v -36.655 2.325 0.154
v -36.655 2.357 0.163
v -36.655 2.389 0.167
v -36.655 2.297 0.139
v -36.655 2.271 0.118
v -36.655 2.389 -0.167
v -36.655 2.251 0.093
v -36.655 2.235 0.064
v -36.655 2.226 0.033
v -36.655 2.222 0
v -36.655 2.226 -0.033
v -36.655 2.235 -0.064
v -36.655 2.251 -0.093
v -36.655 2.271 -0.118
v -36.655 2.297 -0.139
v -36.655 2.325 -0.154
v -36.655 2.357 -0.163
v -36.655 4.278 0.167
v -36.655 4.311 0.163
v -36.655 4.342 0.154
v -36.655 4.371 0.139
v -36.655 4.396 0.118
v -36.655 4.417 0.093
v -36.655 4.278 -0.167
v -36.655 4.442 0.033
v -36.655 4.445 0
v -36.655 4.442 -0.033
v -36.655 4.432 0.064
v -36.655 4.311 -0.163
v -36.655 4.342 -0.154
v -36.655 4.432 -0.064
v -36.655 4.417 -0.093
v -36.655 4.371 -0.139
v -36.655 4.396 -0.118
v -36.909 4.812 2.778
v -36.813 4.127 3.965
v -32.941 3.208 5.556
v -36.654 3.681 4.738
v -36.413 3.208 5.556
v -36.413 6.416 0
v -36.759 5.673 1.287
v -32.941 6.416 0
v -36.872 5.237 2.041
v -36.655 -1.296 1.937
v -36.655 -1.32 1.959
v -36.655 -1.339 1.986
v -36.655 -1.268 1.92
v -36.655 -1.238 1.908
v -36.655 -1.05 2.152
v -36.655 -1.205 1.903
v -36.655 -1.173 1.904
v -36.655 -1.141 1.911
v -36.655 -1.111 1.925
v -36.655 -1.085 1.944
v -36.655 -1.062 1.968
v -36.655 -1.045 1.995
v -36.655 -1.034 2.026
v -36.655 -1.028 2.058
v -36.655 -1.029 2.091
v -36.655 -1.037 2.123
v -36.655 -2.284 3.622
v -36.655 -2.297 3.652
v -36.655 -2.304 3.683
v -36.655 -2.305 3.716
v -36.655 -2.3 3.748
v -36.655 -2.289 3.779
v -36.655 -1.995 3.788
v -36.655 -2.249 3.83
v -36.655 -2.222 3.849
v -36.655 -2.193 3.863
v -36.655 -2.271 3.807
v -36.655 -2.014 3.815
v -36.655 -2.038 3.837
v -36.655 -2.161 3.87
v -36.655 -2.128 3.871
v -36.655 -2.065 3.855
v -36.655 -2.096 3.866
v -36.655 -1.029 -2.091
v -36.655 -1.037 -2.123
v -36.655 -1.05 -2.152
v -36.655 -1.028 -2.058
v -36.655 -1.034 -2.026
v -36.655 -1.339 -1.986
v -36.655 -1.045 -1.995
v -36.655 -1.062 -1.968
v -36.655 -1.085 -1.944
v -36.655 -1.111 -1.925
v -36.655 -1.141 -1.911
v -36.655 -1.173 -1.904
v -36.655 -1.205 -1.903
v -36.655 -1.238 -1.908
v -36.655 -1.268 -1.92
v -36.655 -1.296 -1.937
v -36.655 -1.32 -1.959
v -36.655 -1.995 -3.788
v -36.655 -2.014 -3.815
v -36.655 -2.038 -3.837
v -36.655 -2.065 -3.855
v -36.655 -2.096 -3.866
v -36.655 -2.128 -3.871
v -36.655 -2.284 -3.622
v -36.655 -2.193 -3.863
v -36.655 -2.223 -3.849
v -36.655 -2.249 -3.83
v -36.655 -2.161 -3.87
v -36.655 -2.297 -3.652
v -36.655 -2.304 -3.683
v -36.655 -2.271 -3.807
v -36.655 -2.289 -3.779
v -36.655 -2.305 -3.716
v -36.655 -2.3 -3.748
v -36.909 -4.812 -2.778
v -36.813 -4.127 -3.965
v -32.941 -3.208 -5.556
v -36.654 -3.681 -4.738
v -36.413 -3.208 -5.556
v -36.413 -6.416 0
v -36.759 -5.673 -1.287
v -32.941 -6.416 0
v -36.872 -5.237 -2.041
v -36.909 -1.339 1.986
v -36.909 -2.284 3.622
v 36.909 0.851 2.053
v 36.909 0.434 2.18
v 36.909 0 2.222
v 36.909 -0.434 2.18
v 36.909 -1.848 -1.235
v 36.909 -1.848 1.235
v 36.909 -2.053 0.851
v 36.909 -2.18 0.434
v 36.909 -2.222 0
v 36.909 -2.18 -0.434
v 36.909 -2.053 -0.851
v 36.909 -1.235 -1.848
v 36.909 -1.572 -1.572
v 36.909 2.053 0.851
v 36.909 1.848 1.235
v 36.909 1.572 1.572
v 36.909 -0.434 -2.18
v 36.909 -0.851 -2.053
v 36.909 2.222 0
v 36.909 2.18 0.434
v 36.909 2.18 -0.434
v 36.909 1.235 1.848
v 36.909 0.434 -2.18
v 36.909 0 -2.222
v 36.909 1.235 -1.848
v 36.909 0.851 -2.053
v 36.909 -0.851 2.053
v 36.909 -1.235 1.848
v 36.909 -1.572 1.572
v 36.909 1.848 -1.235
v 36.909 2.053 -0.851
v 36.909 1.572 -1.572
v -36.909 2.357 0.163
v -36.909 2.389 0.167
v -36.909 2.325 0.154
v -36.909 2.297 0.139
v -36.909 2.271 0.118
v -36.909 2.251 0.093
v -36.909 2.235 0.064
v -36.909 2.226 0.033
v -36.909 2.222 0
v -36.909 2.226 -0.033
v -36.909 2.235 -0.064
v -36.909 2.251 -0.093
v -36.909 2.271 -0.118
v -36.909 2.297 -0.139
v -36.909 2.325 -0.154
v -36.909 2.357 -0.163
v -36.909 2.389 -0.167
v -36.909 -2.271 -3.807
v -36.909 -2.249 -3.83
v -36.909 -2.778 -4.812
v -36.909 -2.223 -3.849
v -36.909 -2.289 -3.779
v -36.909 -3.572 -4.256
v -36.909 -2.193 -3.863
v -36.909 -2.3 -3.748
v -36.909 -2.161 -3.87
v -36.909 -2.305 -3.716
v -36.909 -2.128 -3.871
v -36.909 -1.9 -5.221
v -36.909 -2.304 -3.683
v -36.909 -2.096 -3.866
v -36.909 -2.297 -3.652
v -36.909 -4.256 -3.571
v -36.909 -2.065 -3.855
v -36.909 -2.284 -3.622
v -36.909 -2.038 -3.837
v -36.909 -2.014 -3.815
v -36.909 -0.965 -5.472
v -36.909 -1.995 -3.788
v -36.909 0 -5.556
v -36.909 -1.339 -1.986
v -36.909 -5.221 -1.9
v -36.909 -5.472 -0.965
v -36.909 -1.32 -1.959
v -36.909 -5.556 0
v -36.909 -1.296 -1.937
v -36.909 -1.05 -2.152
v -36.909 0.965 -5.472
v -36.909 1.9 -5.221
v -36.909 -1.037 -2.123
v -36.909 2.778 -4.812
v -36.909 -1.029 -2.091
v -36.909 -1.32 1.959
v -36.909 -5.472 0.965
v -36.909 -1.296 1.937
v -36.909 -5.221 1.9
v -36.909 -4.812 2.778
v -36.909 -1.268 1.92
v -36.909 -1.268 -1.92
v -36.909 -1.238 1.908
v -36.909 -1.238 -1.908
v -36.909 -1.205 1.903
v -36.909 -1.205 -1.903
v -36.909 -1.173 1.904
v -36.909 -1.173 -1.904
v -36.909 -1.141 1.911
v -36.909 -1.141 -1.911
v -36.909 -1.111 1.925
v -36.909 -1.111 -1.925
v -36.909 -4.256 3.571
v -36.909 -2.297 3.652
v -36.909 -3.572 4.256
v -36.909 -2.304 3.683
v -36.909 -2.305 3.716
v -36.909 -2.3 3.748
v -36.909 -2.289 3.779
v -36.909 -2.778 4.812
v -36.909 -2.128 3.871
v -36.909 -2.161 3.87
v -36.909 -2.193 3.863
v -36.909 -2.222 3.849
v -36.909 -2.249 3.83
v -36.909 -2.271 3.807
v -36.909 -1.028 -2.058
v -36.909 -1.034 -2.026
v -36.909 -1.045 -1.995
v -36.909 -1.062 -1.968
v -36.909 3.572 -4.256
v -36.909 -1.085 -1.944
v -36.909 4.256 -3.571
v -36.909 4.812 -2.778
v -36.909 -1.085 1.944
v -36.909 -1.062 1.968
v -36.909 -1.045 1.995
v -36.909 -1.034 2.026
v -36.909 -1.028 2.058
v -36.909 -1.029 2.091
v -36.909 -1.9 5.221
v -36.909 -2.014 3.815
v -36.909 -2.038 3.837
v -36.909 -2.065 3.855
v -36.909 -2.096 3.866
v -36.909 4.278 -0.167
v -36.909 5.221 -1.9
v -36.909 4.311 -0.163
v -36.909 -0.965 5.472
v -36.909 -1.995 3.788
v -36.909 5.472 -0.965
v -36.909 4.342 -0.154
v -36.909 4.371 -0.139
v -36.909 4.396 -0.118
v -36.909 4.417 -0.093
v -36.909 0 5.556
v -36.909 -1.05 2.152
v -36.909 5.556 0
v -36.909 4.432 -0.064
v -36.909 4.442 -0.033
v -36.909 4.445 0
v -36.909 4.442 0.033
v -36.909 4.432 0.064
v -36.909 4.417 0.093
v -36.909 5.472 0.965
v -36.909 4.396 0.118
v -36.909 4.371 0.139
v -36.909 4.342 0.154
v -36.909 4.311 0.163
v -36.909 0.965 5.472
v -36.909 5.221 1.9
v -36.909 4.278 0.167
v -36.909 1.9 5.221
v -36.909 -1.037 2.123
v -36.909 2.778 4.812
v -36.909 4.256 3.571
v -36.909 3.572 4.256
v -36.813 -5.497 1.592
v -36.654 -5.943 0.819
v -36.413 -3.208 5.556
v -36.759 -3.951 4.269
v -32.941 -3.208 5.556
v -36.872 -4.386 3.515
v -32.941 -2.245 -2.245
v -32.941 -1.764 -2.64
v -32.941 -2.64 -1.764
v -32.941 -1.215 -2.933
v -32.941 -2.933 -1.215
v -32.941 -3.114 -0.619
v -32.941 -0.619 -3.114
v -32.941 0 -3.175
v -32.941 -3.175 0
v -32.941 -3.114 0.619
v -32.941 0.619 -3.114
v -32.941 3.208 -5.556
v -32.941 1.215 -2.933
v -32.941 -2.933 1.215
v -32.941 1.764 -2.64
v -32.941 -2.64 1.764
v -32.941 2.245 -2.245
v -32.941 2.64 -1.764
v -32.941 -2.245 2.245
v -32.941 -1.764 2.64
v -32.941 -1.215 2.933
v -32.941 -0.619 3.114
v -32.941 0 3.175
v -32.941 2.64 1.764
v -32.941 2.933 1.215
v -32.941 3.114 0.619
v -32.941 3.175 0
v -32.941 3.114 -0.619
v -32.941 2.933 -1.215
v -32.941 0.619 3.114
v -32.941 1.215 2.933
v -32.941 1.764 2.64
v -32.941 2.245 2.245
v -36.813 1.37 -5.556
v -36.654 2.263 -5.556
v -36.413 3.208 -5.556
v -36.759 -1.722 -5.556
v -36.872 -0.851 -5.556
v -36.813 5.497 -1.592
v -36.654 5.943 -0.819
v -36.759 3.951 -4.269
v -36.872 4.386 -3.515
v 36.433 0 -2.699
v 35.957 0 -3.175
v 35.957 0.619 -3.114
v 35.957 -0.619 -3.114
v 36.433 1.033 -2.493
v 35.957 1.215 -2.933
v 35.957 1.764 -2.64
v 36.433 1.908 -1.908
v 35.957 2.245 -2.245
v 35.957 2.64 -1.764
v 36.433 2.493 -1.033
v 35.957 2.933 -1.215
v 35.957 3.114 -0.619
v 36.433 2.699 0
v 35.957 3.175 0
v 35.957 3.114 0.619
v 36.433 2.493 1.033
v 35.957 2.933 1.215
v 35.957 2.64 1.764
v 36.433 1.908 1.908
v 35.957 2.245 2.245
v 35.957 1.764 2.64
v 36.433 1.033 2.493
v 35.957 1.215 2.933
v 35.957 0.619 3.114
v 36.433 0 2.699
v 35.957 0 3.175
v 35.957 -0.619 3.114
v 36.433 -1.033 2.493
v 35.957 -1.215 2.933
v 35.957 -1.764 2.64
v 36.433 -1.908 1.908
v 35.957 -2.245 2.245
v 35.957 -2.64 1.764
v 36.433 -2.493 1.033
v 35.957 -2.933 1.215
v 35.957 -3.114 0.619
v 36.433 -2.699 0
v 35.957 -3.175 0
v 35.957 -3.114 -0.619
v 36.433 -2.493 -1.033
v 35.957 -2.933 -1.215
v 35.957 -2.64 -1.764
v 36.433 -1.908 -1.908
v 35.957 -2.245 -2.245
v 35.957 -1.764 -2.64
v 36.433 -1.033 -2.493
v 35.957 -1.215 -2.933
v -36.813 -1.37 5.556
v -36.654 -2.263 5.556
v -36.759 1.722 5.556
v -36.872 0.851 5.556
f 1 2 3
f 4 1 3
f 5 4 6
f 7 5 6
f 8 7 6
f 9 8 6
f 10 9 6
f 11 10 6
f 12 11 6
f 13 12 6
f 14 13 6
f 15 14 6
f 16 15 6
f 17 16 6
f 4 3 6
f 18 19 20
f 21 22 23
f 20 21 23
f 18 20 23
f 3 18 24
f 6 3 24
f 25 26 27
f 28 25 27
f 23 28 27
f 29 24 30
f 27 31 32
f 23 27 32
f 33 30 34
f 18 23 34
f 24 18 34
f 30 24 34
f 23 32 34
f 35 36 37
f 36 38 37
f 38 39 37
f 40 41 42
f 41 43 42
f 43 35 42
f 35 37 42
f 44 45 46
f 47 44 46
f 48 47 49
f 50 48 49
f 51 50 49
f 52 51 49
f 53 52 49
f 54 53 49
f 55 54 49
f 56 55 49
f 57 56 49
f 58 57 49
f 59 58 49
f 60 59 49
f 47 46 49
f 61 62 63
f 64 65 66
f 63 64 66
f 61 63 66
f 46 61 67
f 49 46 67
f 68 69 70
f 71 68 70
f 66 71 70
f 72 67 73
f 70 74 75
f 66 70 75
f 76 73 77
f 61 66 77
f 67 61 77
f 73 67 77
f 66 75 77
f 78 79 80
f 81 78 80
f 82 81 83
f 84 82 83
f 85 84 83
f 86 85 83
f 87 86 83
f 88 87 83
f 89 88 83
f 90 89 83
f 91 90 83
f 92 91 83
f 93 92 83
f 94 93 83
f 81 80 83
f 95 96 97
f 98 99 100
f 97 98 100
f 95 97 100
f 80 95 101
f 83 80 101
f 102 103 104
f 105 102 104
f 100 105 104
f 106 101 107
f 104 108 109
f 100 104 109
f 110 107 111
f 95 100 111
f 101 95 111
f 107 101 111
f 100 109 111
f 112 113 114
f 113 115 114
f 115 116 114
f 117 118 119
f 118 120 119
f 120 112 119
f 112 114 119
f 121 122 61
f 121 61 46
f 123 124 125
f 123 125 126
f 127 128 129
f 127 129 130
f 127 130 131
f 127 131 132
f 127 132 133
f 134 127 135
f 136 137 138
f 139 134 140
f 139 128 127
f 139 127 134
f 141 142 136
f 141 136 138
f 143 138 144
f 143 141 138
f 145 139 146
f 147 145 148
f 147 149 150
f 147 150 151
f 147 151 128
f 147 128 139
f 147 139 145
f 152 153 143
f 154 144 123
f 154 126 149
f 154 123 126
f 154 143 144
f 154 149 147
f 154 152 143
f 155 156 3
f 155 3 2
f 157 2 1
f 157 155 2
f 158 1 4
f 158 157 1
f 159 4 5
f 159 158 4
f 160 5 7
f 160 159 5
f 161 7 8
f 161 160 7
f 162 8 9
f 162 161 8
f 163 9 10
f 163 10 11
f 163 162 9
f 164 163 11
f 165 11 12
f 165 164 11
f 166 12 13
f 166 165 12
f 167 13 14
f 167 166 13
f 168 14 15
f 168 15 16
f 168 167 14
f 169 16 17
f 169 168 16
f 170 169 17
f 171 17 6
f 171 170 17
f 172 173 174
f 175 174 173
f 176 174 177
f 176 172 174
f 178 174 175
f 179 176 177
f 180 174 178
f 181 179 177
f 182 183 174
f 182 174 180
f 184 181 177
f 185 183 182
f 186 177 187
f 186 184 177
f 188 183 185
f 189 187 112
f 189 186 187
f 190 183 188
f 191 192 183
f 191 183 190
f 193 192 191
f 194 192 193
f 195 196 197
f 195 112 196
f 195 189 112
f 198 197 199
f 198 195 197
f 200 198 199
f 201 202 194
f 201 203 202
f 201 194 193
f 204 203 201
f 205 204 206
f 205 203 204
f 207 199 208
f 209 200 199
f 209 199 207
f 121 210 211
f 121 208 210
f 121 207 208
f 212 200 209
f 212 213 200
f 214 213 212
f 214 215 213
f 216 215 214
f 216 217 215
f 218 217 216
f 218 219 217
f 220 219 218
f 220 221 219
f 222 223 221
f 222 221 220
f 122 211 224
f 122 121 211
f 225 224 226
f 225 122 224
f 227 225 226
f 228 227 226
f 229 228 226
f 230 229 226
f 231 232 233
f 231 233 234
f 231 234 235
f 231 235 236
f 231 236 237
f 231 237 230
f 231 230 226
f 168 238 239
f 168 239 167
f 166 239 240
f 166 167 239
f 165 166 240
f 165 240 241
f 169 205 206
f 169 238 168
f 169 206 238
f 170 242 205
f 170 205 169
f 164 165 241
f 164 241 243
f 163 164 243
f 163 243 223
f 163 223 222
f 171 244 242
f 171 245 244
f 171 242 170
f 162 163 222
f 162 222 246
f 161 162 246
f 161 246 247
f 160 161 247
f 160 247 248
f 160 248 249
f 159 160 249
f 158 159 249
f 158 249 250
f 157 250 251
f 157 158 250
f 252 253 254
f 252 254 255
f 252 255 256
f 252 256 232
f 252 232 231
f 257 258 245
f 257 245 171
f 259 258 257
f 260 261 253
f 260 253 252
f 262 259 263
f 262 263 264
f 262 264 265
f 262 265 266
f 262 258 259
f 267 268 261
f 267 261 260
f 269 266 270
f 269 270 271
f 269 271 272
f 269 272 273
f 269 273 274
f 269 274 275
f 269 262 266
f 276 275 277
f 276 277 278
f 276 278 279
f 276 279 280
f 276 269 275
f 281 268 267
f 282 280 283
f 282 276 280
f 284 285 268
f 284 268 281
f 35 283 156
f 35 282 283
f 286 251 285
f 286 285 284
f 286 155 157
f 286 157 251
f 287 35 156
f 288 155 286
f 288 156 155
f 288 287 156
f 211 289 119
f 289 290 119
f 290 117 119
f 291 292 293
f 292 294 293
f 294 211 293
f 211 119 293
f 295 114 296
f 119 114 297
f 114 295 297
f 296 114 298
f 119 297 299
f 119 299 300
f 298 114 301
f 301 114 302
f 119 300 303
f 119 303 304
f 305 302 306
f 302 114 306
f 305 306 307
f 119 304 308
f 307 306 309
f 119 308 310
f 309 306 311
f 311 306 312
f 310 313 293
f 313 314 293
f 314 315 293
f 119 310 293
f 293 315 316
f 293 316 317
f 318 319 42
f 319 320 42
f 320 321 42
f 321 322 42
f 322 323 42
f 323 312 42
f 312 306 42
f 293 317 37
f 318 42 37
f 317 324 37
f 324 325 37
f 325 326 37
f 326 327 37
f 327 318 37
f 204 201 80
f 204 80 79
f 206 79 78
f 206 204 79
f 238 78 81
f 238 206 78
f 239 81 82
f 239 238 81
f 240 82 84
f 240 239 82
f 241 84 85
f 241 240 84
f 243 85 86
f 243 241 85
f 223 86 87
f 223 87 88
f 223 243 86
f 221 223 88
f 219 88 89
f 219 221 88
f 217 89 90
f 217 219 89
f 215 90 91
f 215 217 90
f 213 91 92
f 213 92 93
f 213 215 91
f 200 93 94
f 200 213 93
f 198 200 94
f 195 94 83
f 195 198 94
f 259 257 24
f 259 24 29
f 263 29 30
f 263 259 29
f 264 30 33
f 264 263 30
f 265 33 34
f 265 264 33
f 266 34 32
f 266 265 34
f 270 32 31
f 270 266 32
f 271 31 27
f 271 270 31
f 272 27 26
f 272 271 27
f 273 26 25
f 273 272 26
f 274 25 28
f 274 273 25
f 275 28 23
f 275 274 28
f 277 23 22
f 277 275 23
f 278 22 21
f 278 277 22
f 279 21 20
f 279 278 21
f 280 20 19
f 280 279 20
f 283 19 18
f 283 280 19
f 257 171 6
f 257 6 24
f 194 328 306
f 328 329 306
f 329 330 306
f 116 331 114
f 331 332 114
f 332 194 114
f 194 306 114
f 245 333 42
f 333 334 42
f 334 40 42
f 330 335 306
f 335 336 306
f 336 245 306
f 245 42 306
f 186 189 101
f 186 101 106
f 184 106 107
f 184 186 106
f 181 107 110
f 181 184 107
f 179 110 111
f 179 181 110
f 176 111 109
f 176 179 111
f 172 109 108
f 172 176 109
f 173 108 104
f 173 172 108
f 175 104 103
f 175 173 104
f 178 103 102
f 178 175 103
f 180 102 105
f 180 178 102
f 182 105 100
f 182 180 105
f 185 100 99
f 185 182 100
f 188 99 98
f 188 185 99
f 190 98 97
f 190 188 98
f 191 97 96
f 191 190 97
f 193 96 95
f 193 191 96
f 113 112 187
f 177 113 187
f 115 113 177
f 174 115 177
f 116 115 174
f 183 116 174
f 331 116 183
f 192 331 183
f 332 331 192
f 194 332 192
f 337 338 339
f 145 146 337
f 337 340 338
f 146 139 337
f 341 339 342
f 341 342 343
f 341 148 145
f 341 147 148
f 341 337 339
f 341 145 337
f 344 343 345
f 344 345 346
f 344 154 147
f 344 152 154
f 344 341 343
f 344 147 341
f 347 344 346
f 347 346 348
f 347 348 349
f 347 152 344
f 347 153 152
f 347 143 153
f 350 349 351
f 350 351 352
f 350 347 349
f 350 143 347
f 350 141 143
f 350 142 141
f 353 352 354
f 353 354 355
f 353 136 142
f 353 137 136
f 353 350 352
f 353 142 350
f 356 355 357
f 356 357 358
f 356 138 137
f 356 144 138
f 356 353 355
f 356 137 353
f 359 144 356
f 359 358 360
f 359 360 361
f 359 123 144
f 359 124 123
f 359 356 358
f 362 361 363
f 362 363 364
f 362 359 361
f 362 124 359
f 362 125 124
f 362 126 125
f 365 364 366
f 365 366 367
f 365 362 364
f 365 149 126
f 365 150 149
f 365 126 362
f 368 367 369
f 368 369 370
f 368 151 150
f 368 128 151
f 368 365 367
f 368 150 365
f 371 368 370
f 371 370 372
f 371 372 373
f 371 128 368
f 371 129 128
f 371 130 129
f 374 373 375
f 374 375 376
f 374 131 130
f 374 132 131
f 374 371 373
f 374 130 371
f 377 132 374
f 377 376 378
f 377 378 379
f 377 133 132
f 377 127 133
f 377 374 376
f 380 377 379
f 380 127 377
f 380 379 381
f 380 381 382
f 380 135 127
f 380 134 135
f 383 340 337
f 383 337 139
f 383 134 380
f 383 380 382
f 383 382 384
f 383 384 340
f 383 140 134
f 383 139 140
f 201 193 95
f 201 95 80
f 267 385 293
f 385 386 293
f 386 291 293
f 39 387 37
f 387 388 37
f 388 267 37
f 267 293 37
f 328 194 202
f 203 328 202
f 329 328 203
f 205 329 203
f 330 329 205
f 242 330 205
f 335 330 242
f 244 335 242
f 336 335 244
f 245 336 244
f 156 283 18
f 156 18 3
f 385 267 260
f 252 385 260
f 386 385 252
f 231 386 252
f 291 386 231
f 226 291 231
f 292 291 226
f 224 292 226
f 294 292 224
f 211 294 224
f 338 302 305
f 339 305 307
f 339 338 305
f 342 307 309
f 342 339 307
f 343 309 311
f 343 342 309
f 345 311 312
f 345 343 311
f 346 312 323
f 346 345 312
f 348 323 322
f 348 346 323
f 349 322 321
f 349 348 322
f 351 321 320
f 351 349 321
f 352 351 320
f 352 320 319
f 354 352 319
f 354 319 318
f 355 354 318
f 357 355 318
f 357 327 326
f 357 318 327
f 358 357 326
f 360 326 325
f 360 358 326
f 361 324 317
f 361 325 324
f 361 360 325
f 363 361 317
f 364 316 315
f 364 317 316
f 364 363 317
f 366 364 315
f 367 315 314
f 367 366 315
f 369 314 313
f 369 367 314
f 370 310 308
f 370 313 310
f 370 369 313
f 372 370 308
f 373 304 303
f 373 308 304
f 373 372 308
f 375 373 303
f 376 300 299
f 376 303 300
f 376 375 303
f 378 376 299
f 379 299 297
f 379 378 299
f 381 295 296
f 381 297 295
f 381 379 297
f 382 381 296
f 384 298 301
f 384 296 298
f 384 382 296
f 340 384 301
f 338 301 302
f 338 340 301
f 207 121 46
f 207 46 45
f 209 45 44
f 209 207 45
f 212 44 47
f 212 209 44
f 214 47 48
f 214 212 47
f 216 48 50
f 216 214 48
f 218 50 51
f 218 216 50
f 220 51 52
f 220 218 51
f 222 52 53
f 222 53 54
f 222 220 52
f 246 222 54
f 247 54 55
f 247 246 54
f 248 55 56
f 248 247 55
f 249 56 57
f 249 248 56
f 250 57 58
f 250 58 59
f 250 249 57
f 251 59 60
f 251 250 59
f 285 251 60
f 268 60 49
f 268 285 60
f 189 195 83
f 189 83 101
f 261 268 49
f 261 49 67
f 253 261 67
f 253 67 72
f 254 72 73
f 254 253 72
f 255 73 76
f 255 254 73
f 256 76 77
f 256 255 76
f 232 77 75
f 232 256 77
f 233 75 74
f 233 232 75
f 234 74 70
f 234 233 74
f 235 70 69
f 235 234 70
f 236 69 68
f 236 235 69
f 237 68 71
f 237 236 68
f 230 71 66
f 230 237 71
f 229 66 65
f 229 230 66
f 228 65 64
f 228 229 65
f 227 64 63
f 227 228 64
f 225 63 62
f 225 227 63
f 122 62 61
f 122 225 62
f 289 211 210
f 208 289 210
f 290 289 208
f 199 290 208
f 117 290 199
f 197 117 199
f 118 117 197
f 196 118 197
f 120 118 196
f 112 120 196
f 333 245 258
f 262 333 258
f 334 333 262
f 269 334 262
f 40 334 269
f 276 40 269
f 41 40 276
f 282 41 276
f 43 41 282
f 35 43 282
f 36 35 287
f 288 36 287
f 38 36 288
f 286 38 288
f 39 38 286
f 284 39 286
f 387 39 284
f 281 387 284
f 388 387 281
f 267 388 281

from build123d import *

# Parameters (mm, degrees)
SKETCH5_R           = 3.175
BOSS_EXTRUDE3_DEPTH = 69.85
CHAMFER1_SIZE       = 0.9525
BOSS_EXTRUDE4_DEPTH = 3.96875
SKETCH8_OUTSIDE_W   = 287.44
SKETCH8_OUTSIDE_H   = 289.16
SKETCH8_OUTSIDE_R   = 5.55625
CUT_EXTRUDE3_DEPTH  = 74.81875
CUT_EXTRUDE3_TAPER  = 60
CUT_EXTRUDE4_DEPTH  = 0.254
CIRPATTERN1_COUNT   = 3


with BuildPart() as part:
    # Sketch5 → Boss-Extrude3 (new body)
    with BuildSketch(Plane(origin=(36.909375, 0, 0), x_dir=(0, 0, -1), z_dir=(1, 0, 0))):
        Circle(SKETCH5_R)
    extrude(amount=-BOSS_EXTRUDE3_DEPTH)

    # Chamfer1
    chamfer1_edges = [part.edges().sort_by_distance(p)[0] for p in [
        (36.909375, 0, 3.175),
    ]]
    chamfer(chamfer1_edges, length=CHAMFER1_SIZE)

    # Sketch11 → Revolve1 (revolve)
    with BuildSketch(Plane.XY):
        Polygon((-32.940625, 3.175), (-32.940625, 0), (21.034375, 0), (17.859375, 3.175), align=None)
    revolve(axis=Axis((-32.940625, 0, 0), (1, 0, 0)))

    # Sketch6 → Boss-Extrude4 (add)
    with BuildSketch(Plane.ZY.offset(32.940625)):
        Polygon((5.55625, 3.207902433), (0, 6.415804866), (-5.55625, 3.207902433), (-5.55625, -3.207902433), (0, -6.415804866), (5.55625, -3.207902433), align=None)
    extrude(amount=BOSS_EXTRUDE4_DEPTH)

    # Sketch8 outside → Cut-Extrude3 (cut, through all)
    with BuildSketch(Plane.ZY.offset(36.909375)):
        Rectangle(SKETCH8_OUTSIDE_W, SKETCH8_OUTSIDE_H)
        Circle(SKETCH8_OUTSIDE_R, mode=Mode.SUBTRACT)
    extrude(amount=-CUT_EXTRUDE3_DEPTH, taper=CUT_EXTRUDE3_TAPER, mode=Mode.SUBTRACT)

    # Sketch12 → Cut-Extrude4 (cut)
    with BuildSketch(Plane.ZY.offset(36.909375)):
        with BuildLine():
            Line((0.1666875, 4.2783125), (0.1666875, 2.3891875))
            ThreePointArc((0.1666875, 2.3891875), (0, 2.2225), (-0.1666875, 2.3891875))
            Line((-0.1666875, 2.3891875), (-0.1666875, 4.2783125))
            ThreePointArc((-0.1666875, 4.2783125), (0, 4.445), (0.1666875, 4.2783125))
        make_face()
    cut_extrude4 = extrude(amount=-CUT_EXTRUDE4_DEPTH, mode=Mode.SUBTRACT)

    # CirPattern1: Cut-Extrude4 ×3 about axis
    cirpattern1_axis = Axis((0, 0, 0), (1, 0, 0))
    for i in range(1, CIRPATTERN1_COUNT):
        add(cut_extrude4.rotate(cirpattern1_axis, i * 360 / CIRPATTERN1_COUNT), mode=Mode.SUBTRACT)


solid = part.part
